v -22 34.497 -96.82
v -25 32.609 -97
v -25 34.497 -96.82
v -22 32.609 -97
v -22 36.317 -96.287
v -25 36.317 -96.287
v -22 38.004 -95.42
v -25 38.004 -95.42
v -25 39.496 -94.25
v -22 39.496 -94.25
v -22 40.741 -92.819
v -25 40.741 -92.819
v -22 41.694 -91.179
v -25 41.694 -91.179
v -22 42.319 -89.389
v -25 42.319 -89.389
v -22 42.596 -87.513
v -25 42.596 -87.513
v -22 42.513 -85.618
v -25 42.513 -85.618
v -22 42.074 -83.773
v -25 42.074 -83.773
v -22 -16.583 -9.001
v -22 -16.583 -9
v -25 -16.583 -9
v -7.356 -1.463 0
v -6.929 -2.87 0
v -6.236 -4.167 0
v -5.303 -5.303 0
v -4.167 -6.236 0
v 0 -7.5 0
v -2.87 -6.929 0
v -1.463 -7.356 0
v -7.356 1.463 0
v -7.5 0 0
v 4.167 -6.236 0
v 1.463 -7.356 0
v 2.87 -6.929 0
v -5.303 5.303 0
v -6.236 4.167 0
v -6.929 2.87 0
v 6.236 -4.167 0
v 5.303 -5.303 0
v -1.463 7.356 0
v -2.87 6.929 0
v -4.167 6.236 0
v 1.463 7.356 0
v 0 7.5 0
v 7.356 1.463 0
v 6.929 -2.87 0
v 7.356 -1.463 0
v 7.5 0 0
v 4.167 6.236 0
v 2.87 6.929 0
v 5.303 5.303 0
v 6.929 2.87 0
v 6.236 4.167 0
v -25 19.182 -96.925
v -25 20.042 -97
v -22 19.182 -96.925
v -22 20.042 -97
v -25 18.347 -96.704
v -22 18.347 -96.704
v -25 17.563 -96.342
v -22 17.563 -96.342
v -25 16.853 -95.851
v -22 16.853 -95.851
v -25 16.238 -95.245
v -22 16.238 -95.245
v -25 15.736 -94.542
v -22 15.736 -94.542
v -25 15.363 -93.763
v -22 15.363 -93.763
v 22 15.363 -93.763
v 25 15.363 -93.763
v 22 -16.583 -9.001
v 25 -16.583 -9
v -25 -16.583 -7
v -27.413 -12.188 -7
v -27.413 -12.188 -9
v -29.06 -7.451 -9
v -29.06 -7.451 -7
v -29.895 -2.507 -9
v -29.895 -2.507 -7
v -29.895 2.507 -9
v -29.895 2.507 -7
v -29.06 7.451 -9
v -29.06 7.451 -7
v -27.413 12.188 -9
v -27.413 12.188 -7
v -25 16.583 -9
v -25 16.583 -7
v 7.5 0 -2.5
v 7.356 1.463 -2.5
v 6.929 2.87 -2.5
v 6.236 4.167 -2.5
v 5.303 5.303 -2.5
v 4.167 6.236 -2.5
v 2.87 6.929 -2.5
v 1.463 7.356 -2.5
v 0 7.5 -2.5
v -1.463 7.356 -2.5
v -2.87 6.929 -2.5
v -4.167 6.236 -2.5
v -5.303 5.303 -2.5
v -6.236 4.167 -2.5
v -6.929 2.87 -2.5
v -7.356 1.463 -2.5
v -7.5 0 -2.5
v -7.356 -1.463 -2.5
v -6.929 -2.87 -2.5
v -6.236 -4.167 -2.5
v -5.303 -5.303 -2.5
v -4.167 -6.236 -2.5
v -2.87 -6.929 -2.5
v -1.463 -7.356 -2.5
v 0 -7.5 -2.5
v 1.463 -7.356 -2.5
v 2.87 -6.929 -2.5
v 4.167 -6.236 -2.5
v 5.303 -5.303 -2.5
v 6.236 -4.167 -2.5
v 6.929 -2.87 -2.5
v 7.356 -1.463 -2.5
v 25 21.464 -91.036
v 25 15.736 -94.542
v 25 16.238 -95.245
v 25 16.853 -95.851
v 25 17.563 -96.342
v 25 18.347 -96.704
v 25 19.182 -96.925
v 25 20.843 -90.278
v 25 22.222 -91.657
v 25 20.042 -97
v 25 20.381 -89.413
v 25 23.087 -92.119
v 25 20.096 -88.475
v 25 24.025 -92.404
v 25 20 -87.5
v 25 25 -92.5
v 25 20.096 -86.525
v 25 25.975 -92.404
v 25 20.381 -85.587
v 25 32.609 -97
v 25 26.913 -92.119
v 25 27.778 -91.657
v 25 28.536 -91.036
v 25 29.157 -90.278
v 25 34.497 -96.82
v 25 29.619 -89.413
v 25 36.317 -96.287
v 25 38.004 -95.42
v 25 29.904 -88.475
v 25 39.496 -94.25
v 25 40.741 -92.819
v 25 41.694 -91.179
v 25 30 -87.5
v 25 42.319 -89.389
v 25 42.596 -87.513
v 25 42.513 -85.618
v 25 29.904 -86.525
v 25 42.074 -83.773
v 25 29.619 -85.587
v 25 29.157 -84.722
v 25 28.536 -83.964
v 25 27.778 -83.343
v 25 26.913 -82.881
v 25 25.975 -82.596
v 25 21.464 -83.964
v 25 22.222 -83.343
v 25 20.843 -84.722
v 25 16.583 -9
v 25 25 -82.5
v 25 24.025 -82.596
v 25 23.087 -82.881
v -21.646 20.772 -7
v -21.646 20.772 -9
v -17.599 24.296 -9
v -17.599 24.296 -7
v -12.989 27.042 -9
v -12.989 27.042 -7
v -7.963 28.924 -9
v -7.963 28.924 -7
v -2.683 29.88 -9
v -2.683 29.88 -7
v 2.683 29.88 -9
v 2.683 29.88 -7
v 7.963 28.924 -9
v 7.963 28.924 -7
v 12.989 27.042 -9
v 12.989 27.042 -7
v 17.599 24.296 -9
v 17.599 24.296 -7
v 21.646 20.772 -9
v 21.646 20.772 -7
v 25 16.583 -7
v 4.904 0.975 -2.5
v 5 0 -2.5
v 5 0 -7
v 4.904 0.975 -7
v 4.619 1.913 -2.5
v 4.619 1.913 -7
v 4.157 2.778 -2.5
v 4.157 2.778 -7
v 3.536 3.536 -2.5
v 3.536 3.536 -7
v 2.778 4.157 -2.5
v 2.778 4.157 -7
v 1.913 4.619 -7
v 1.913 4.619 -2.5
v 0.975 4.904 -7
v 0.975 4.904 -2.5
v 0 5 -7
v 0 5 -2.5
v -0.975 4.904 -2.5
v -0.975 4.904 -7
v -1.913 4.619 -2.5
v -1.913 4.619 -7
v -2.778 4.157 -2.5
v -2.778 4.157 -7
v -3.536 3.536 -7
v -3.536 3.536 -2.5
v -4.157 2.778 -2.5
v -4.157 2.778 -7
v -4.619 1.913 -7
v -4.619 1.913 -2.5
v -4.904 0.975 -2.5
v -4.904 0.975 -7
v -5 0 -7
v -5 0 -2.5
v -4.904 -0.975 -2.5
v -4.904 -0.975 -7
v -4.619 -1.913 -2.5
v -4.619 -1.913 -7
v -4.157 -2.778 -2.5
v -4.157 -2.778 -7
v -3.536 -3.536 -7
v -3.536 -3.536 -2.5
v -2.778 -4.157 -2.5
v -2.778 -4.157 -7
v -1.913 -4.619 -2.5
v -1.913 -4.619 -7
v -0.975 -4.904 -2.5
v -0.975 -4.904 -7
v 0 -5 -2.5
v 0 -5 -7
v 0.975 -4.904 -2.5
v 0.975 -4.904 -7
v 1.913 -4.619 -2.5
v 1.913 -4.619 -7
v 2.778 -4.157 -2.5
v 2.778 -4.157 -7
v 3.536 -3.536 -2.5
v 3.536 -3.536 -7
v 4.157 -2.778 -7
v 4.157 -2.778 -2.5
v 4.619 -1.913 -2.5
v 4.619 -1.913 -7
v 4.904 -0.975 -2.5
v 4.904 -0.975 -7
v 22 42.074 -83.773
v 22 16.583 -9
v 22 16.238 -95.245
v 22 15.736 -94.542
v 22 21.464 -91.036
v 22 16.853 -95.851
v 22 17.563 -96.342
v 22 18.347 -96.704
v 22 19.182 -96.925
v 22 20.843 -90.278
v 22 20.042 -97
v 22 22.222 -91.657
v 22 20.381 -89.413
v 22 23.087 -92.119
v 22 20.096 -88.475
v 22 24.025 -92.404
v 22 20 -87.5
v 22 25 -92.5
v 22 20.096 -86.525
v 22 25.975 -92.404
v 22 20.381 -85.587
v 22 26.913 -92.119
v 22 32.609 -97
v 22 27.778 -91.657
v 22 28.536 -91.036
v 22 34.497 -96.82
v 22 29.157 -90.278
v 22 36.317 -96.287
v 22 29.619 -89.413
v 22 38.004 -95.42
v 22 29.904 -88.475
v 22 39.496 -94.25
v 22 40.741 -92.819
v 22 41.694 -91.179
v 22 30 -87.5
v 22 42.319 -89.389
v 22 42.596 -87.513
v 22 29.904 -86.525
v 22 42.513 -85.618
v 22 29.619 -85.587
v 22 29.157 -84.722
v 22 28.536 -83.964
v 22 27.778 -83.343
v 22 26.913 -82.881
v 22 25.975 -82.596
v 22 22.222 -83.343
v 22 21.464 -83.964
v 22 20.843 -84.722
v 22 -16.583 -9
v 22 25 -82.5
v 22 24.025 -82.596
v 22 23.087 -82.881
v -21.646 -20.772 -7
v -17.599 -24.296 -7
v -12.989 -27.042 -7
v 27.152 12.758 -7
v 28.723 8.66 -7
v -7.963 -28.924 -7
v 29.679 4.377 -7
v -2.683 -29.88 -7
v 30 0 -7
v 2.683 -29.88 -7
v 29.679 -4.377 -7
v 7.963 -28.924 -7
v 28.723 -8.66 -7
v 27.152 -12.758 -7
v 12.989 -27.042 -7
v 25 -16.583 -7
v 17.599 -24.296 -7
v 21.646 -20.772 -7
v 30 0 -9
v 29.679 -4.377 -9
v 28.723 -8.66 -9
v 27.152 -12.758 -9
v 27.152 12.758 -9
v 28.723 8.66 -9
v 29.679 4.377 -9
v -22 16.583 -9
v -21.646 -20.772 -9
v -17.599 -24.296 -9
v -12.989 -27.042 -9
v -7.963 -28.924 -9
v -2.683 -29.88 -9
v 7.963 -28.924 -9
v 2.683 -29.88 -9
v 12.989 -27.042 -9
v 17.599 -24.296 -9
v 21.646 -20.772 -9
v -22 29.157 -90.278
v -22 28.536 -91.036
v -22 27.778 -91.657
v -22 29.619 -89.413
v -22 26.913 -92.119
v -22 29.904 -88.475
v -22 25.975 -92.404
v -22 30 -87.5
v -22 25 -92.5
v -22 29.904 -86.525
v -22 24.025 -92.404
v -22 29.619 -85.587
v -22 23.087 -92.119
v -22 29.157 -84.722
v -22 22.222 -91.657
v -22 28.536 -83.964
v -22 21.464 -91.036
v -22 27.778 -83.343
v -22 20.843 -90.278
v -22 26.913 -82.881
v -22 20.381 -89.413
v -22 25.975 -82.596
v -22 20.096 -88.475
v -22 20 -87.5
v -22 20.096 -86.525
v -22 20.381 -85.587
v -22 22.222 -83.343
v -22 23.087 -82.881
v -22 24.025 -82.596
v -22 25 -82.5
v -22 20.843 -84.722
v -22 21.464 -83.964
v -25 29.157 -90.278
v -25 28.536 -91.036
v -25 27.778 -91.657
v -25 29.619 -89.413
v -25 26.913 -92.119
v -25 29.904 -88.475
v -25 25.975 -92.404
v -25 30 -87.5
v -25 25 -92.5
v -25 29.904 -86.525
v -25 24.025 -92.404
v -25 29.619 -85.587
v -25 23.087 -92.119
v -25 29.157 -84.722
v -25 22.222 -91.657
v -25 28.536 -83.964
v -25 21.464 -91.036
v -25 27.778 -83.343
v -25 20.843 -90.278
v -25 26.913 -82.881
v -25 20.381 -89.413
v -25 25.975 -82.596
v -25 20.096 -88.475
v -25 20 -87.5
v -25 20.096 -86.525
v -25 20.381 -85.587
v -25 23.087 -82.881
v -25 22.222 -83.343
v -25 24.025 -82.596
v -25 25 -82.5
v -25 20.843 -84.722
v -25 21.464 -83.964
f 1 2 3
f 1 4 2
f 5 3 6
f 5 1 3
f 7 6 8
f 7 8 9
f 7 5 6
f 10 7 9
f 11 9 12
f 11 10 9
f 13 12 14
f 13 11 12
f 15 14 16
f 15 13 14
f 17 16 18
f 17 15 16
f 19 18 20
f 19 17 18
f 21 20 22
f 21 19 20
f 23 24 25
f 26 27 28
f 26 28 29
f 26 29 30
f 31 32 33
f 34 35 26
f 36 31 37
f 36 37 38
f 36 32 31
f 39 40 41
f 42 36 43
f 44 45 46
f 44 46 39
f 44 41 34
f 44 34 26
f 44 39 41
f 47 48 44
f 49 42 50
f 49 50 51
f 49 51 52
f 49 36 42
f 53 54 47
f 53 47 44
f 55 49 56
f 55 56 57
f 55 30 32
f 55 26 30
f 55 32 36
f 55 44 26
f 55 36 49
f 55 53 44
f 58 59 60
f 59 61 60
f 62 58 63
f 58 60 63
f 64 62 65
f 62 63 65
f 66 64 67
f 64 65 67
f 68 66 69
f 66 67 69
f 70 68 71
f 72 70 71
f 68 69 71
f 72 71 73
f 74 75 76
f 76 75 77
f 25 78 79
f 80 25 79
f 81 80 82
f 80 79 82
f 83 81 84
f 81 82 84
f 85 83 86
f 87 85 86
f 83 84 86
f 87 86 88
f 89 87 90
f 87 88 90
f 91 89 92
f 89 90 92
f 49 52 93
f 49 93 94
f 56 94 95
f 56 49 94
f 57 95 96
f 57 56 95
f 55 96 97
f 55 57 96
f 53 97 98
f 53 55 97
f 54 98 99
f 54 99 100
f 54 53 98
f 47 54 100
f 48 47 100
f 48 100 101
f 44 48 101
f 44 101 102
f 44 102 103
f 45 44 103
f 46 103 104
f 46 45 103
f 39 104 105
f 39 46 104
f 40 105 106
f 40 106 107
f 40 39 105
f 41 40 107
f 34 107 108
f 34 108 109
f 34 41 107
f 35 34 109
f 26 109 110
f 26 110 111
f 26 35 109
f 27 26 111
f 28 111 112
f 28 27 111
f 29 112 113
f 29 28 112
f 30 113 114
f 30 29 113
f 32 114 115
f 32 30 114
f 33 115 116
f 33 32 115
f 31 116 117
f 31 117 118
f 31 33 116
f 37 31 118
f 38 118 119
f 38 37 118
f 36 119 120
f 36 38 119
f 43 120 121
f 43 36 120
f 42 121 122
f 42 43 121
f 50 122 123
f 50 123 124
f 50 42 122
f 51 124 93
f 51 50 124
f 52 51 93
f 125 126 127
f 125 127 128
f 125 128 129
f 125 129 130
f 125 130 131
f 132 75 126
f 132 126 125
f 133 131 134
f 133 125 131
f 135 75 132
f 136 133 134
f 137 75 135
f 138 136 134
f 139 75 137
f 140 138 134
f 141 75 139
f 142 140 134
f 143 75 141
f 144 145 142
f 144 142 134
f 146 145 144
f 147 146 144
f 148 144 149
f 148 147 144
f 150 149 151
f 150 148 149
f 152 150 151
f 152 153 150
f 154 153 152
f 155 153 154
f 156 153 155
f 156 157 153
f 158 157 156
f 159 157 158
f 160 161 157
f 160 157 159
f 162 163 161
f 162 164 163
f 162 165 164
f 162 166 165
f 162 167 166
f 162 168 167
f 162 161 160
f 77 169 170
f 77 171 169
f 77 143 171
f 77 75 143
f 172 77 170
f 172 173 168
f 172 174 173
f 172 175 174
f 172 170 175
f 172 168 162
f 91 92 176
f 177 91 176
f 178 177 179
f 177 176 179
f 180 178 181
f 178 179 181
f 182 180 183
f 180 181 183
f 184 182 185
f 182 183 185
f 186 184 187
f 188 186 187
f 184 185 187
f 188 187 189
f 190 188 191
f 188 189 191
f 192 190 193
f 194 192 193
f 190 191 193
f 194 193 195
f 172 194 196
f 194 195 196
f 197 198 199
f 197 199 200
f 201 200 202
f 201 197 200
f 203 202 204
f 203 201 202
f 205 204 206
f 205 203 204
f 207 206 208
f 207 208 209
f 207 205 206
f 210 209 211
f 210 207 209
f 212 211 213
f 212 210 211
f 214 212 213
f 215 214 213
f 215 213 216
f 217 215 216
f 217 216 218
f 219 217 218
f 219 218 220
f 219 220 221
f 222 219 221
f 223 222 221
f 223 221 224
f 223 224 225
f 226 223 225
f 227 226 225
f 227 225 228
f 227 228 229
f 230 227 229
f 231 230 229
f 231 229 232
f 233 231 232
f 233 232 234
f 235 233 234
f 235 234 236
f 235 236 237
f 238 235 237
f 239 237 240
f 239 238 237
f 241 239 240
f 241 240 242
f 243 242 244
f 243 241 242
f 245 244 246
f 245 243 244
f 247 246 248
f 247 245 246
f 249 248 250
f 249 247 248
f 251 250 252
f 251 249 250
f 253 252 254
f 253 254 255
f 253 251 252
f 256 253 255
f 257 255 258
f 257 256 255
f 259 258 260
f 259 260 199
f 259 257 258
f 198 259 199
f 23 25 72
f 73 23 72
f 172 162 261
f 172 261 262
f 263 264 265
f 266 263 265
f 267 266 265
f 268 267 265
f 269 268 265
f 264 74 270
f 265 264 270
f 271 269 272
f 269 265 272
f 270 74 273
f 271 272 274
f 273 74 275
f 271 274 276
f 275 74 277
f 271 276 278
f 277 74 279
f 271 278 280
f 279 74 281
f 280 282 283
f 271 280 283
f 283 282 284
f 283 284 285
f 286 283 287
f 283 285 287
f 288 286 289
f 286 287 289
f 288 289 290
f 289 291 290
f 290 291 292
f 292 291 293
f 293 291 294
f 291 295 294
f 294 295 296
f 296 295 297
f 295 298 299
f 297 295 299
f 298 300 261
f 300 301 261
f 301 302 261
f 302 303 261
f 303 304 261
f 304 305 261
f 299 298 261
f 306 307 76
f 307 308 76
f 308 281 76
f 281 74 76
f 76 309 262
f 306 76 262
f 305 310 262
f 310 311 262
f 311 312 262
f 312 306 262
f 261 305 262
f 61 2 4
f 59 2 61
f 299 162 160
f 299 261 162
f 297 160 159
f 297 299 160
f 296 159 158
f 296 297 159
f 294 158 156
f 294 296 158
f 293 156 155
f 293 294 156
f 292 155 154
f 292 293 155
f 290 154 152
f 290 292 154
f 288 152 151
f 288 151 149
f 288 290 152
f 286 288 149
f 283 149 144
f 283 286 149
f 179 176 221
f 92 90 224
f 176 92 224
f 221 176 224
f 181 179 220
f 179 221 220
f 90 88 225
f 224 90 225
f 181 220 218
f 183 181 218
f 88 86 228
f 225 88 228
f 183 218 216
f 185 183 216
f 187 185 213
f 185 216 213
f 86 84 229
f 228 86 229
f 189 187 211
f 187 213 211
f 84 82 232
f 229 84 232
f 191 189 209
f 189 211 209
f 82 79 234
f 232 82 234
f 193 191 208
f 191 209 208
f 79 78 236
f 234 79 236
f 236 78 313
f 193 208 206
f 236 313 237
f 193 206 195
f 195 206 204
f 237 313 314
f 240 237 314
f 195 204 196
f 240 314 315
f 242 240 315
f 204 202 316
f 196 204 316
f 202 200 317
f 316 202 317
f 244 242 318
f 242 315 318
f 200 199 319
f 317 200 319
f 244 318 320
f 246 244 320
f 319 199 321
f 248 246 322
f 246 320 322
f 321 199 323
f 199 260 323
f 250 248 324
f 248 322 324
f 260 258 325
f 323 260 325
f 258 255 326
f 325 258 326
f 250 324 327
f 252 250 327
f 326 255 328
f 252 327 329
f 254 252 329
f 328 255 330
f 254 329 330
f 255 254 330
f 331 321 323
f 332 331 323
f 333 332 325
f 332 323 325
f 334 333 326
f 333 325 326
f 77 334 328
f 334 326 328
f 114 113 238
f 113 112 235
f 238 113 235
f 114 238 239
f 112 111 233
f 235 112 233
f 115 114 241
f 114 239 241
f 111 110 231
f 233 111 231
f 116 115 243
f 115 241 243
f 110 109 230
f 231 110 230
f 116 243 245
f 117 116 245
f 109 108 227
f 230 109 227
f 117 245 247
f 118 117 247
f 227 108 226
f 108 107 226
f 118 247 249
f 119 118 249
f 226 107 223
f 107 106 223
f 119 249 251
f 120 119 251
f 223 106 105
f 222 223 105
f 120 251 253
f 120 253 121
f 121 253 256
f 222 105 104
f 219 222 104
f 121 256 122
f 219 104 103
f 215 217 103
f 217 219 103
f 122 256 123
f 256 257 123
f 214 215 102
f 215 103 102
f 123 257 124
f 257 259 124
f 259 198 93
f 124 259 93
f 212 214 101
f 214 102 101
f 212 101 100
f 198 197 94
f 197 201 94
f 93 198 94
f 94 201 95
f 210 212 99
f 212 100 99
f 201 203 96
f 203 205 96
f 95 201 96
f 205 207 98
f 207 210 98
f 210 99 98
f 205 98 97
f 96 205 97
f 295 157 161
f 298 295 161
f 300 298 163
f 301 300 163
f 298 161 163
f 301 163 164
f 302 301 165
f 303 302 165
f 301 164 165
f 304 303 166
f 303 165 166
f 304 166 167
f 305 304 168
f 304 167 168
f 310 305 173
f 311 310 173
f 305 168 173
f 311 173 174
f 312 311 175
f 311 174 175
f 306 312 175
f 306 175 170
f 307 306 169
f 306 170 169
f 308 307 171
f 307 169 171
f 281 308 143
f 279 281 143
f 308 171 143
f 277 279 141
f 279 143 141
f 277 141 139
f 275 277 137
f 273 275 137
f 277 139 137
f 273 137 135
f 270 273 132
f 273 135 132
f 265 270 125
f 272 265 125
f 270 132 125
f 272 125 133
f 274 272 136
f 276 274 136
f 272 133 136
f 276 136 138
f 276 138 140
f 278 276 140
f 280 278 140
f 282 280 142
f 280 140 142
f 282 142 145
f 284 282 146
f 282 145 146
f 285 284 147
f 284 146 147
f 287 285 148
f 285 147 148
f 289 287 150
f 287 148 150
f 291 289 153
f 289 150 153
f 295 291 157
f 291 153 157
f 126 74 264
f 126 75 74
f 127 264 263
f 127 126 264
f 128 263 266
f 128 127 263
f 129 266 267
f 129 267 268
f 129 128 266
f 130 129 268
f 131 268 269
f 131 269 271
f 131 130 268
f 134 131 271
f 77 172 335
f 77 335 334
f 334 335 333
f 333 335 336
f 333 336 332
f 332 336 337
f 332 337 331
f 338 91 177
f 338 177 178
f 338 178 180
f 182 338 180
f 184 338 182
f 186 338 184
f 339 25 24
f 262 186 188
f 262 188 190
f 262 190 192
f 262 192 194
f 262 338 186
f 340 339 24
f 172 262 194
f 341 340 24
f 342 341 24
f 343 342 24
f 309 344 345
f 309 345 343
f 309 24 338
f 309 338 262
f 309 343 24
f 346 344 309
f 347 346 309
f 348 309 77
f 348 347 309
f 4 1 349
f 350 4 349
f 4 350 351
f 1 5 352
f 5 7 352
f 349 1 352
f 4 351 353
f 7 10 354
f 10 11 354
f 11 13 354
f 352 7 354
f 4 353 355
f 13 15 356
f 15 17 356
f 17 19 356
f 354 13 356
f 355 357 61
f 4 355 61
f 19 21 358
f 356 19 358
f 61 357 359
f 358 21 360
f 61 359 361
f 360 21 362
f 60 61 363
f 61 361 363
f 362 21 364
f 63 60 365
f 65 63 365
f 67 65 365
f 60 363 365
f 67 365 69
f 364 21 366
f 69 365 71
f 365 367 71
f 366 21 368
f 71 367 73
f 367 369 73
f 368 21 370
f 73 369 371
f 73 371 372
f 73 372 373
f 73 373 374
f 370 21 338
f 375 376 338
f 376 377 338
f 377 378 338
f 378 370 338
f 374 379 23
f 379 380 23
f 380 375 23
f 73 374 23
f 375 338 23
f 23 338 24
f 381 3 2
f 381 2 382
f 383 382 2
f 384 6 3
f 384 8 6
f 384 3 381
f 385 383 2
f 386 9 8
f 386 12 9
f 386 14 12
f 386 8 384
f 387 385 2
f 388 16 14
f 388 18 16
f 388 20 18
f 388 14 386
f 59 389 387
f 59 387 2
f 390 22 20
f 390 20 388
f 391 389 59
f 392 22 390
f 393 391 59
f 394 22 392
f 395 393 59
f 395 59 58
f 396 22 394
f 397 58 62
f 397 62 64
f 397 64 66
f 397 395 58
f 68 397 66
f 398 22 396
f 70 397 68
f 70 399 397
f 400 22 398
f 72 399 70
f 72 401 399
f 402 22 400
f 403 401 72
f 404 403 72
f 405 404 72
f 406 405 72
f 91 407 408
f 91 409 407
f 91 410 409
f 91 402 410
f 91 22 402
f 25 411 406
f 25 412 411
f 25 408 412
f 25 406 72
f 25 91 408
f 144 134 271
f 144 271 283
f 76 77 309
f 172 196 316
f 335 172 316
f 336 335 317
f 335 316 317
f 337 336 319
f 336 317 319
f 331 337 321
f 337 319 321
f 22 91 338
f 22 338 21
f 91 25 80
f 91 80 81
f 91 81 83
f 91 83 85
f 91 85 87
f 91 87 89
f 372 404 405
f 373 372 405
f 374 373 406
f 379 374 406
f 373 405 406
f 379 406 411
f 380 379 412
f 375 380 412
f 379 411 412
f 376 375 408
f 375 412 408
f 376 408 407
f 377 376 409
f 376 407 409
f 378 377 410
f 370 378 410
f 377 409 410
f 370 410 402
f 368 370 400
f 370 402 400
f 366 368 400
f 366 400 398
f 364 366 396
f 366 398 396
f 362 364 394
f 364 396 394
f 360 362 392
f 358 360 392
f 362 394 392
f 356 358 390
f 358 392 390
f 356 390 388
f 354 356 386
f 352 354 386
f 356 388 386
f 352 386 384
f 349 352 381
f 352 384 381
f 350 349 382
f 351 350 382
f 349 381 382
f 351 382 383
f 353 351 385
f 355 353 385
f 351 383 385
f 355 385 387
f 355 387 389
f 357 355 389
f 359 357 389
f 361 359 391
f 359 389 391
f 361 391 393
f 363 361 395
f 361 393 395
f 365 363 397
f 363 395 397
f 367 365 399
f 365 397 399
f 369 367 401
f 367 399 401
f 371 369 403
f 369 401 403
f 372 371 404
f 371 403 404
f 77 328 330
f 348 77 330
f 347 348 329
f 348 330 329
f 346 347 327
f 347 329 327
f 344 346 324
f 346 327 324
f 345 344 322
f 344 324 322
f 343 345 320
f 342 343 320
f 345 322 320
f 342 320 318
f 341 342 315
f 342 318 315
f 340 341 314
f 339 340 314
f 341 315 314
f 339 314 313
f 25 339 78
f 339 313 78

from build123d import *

# Parameters (mm, degrees)
F0_R      = 7.5
F0_R_2    = 5
F1_DEPTH  = 2.5
F2_DEPTH  = 7
F3_R      = 5
F4_DEPTH  = 2
F5_DEPTH  = 90
F7_DEPTH  = 3
F6_R      = 5
F8_DEPTH  = 3
F10_DEPTH = 3
F9_R      = 5
F11_DEPTH = 3
F12_R     = 10
F13_R     = 5
F14_R     = 5


with BuildPart() as f1:
    # F0 (on Top) → F1 (new body)
    with BuildSketch(Plane.XY):
        Circle(F0_R)
        Circle(F0_R_2, mode=Mode.SUBTRACT)
    extrude(amount=-F1_DEPTH)

    # F0 (on Top) → F2 (join)
    with BuildSketch(Plane.XY):
        Circle(F0_R_2)
    extrude(amount=-F2_DEPTH)

    # F3 (on face) → F4 (join)
    with BuildSketch(Plane(origin=(0, 0, -7), x_dir=(1, 0, 0), z_dir=(0, 0, -1))):
        with BuildLine():
            Line((22, 16.5828760482), (25, 16.5831239518))
            ThreePointArc((25, 16.5831239518), (0, 30), (-25, 16.5831239518))
            Line((-25, 16.5831239518), (-22, 16.5828760482))
            Line((-22, 16.5828760482), (-22, 0))
            Line((-22, 0), (-22, -16.5831239518))
            Line((-22, -16.5831239518), (-25, -16.5831239518))
            ThreePointArc((-25, -16.5831239518), (0, -30), (25, -16.5831239518))
            Line((25, -16.5831239518), (22, -16.5831239518))
            Line((22, -16.5831239518), (22, 0))
            Line((22, 0), (22, 16.5828760482))
        make_face()
        Circle(F3_R, mode=Mode.SUBTRACT)
        Circle(F3_R)
    extrude(amount=F4_DEPTH)

    # F3 (on face) → F4, piece 2 (join)
    with BuildSketch(Plane(origin=(0, 0, -7), x_dir=(1, 0, 0), z_dir=(0, 0, -1))):
        with BuildLine():
            Line((-25, 0), (-25, 16.5831239518))
            ThreePointArc((-25, 16.5831239518), (-30, 0), (-25, -16.5831239518))
            Line((-25, -16.5831239518), (-25, 0))
        make_face()
    extrude(amount=F4_DEPTH)

    # F3 (on face) → F4, piece 3 (join)
    with BuildSketch(Plane(origin=(0, 0, -7), x_dir=(1, 0, 0), z_dir=(0, 0, -1))):
        with BuildLine():
            ThreePointArc((25, -16.5831239518), (28.7228132327, -8.6602540378), (30, 0))
            ThreePointArc((30, 0), (28.7228132327, 8.6602540378), (25, 16.5831239518))
            Line((25, 16.5831239518), (25, 0))
            Line((25, 0), (25, -16.5831239518))
        make_face()
    extrude(amount=F4_DEPTH)

    # F3 (on face) → F5 (join)
    with BuildSketch(Plane(origin=(0, 0, -7), x_dir=(1, 0, 0), z_dir=(0, 0, -1))):
        Polygon((-22, 16.5828760482), (-25, 16.5831239518), (-25, 0), (-25, -16.5831239518), (-22, -16.5831239518), (-22, 0), align=None)
        Polygon((25, 0), (25, 16.5831239518), (22, 16.5828760482), (22, 0), (22, -16.5831239518), (25, -16.5831239518), align=None)
    extrude(amount=F5_DEPTH)

    # F6 (on face) → F7 (cut)
    with BuildSketch(Plane.YZ.offset(25)):
        Polygon((16.5831239518, -97), (-16.5831239518, -9), (-16.5831239518, -97), align=None)
    extrude(amount=-F7_DEPTH, mode=Mode.SUBTRACT)

    # F6 (on face) → F8 (join)
    with BuildSketch(Plane.YZ.offset(25)):
        Polygon((16.5831239518, -9), (16.5831239518, -97), (46.5831239518, -97), align=None)
        with Locations((25, -87.5)):
            Circle(F6_R, mode=Mode.SUBTRACT)
    extrude(amount=-F8_DEPTH)

    # F9 (on face) → F10 (cut)
    with BuildSketch(Plane(origin=(-25, 0, 0), x_dir=(0, -1, 0), z_dir=(-1, 0, 0))):
        Polygon((16.5831239518, -97), (16.5831239518, -9), (-16.5831239518, -97), align=None)
    extrude(amount=-F10_DEPTH, mode=Mode.SUBTRACT)

    # F9 (on face) → F11 (join)
    with BuildSketch(Plane(origin=(-25, 0, 0), x_dir=(0, -1, 0), z_dir=(-1, 0, 0))):
        Polygon((-46.5831239518, -97), (-16.5831239518, -97), (-16.5831239518, -9), align=None)
        with Locations((-25, -87.5)):
            Circle(F9_R, mode=Mode.SUBTRACT)
    extrude(amount=-F11_DEPTH)

    # F12
    f12_edges = [f1.edges().sort_by_distance(p)[0] for p in [
        (-23.5, 46.583124, -97),
        (23.5, 46.583124, -97),
    ]]
    fillet(f12_edges, radius=F12_R)

    # F13
    f13_edges = [f1.edges().sort_by_distance(p)[0] for p in [
        (-23.5, 16.583124, -97),
    ]]
    fillet(f13_edges, radius=F13_R)

    # F14
    f14_edges = [f1.edges().sort_by_distance(p)[0] for p in [
        (23.5, 16.583124, -97),
    ]]
    fillet(f14_edges, radius=F14_R)


solid = f1.part
